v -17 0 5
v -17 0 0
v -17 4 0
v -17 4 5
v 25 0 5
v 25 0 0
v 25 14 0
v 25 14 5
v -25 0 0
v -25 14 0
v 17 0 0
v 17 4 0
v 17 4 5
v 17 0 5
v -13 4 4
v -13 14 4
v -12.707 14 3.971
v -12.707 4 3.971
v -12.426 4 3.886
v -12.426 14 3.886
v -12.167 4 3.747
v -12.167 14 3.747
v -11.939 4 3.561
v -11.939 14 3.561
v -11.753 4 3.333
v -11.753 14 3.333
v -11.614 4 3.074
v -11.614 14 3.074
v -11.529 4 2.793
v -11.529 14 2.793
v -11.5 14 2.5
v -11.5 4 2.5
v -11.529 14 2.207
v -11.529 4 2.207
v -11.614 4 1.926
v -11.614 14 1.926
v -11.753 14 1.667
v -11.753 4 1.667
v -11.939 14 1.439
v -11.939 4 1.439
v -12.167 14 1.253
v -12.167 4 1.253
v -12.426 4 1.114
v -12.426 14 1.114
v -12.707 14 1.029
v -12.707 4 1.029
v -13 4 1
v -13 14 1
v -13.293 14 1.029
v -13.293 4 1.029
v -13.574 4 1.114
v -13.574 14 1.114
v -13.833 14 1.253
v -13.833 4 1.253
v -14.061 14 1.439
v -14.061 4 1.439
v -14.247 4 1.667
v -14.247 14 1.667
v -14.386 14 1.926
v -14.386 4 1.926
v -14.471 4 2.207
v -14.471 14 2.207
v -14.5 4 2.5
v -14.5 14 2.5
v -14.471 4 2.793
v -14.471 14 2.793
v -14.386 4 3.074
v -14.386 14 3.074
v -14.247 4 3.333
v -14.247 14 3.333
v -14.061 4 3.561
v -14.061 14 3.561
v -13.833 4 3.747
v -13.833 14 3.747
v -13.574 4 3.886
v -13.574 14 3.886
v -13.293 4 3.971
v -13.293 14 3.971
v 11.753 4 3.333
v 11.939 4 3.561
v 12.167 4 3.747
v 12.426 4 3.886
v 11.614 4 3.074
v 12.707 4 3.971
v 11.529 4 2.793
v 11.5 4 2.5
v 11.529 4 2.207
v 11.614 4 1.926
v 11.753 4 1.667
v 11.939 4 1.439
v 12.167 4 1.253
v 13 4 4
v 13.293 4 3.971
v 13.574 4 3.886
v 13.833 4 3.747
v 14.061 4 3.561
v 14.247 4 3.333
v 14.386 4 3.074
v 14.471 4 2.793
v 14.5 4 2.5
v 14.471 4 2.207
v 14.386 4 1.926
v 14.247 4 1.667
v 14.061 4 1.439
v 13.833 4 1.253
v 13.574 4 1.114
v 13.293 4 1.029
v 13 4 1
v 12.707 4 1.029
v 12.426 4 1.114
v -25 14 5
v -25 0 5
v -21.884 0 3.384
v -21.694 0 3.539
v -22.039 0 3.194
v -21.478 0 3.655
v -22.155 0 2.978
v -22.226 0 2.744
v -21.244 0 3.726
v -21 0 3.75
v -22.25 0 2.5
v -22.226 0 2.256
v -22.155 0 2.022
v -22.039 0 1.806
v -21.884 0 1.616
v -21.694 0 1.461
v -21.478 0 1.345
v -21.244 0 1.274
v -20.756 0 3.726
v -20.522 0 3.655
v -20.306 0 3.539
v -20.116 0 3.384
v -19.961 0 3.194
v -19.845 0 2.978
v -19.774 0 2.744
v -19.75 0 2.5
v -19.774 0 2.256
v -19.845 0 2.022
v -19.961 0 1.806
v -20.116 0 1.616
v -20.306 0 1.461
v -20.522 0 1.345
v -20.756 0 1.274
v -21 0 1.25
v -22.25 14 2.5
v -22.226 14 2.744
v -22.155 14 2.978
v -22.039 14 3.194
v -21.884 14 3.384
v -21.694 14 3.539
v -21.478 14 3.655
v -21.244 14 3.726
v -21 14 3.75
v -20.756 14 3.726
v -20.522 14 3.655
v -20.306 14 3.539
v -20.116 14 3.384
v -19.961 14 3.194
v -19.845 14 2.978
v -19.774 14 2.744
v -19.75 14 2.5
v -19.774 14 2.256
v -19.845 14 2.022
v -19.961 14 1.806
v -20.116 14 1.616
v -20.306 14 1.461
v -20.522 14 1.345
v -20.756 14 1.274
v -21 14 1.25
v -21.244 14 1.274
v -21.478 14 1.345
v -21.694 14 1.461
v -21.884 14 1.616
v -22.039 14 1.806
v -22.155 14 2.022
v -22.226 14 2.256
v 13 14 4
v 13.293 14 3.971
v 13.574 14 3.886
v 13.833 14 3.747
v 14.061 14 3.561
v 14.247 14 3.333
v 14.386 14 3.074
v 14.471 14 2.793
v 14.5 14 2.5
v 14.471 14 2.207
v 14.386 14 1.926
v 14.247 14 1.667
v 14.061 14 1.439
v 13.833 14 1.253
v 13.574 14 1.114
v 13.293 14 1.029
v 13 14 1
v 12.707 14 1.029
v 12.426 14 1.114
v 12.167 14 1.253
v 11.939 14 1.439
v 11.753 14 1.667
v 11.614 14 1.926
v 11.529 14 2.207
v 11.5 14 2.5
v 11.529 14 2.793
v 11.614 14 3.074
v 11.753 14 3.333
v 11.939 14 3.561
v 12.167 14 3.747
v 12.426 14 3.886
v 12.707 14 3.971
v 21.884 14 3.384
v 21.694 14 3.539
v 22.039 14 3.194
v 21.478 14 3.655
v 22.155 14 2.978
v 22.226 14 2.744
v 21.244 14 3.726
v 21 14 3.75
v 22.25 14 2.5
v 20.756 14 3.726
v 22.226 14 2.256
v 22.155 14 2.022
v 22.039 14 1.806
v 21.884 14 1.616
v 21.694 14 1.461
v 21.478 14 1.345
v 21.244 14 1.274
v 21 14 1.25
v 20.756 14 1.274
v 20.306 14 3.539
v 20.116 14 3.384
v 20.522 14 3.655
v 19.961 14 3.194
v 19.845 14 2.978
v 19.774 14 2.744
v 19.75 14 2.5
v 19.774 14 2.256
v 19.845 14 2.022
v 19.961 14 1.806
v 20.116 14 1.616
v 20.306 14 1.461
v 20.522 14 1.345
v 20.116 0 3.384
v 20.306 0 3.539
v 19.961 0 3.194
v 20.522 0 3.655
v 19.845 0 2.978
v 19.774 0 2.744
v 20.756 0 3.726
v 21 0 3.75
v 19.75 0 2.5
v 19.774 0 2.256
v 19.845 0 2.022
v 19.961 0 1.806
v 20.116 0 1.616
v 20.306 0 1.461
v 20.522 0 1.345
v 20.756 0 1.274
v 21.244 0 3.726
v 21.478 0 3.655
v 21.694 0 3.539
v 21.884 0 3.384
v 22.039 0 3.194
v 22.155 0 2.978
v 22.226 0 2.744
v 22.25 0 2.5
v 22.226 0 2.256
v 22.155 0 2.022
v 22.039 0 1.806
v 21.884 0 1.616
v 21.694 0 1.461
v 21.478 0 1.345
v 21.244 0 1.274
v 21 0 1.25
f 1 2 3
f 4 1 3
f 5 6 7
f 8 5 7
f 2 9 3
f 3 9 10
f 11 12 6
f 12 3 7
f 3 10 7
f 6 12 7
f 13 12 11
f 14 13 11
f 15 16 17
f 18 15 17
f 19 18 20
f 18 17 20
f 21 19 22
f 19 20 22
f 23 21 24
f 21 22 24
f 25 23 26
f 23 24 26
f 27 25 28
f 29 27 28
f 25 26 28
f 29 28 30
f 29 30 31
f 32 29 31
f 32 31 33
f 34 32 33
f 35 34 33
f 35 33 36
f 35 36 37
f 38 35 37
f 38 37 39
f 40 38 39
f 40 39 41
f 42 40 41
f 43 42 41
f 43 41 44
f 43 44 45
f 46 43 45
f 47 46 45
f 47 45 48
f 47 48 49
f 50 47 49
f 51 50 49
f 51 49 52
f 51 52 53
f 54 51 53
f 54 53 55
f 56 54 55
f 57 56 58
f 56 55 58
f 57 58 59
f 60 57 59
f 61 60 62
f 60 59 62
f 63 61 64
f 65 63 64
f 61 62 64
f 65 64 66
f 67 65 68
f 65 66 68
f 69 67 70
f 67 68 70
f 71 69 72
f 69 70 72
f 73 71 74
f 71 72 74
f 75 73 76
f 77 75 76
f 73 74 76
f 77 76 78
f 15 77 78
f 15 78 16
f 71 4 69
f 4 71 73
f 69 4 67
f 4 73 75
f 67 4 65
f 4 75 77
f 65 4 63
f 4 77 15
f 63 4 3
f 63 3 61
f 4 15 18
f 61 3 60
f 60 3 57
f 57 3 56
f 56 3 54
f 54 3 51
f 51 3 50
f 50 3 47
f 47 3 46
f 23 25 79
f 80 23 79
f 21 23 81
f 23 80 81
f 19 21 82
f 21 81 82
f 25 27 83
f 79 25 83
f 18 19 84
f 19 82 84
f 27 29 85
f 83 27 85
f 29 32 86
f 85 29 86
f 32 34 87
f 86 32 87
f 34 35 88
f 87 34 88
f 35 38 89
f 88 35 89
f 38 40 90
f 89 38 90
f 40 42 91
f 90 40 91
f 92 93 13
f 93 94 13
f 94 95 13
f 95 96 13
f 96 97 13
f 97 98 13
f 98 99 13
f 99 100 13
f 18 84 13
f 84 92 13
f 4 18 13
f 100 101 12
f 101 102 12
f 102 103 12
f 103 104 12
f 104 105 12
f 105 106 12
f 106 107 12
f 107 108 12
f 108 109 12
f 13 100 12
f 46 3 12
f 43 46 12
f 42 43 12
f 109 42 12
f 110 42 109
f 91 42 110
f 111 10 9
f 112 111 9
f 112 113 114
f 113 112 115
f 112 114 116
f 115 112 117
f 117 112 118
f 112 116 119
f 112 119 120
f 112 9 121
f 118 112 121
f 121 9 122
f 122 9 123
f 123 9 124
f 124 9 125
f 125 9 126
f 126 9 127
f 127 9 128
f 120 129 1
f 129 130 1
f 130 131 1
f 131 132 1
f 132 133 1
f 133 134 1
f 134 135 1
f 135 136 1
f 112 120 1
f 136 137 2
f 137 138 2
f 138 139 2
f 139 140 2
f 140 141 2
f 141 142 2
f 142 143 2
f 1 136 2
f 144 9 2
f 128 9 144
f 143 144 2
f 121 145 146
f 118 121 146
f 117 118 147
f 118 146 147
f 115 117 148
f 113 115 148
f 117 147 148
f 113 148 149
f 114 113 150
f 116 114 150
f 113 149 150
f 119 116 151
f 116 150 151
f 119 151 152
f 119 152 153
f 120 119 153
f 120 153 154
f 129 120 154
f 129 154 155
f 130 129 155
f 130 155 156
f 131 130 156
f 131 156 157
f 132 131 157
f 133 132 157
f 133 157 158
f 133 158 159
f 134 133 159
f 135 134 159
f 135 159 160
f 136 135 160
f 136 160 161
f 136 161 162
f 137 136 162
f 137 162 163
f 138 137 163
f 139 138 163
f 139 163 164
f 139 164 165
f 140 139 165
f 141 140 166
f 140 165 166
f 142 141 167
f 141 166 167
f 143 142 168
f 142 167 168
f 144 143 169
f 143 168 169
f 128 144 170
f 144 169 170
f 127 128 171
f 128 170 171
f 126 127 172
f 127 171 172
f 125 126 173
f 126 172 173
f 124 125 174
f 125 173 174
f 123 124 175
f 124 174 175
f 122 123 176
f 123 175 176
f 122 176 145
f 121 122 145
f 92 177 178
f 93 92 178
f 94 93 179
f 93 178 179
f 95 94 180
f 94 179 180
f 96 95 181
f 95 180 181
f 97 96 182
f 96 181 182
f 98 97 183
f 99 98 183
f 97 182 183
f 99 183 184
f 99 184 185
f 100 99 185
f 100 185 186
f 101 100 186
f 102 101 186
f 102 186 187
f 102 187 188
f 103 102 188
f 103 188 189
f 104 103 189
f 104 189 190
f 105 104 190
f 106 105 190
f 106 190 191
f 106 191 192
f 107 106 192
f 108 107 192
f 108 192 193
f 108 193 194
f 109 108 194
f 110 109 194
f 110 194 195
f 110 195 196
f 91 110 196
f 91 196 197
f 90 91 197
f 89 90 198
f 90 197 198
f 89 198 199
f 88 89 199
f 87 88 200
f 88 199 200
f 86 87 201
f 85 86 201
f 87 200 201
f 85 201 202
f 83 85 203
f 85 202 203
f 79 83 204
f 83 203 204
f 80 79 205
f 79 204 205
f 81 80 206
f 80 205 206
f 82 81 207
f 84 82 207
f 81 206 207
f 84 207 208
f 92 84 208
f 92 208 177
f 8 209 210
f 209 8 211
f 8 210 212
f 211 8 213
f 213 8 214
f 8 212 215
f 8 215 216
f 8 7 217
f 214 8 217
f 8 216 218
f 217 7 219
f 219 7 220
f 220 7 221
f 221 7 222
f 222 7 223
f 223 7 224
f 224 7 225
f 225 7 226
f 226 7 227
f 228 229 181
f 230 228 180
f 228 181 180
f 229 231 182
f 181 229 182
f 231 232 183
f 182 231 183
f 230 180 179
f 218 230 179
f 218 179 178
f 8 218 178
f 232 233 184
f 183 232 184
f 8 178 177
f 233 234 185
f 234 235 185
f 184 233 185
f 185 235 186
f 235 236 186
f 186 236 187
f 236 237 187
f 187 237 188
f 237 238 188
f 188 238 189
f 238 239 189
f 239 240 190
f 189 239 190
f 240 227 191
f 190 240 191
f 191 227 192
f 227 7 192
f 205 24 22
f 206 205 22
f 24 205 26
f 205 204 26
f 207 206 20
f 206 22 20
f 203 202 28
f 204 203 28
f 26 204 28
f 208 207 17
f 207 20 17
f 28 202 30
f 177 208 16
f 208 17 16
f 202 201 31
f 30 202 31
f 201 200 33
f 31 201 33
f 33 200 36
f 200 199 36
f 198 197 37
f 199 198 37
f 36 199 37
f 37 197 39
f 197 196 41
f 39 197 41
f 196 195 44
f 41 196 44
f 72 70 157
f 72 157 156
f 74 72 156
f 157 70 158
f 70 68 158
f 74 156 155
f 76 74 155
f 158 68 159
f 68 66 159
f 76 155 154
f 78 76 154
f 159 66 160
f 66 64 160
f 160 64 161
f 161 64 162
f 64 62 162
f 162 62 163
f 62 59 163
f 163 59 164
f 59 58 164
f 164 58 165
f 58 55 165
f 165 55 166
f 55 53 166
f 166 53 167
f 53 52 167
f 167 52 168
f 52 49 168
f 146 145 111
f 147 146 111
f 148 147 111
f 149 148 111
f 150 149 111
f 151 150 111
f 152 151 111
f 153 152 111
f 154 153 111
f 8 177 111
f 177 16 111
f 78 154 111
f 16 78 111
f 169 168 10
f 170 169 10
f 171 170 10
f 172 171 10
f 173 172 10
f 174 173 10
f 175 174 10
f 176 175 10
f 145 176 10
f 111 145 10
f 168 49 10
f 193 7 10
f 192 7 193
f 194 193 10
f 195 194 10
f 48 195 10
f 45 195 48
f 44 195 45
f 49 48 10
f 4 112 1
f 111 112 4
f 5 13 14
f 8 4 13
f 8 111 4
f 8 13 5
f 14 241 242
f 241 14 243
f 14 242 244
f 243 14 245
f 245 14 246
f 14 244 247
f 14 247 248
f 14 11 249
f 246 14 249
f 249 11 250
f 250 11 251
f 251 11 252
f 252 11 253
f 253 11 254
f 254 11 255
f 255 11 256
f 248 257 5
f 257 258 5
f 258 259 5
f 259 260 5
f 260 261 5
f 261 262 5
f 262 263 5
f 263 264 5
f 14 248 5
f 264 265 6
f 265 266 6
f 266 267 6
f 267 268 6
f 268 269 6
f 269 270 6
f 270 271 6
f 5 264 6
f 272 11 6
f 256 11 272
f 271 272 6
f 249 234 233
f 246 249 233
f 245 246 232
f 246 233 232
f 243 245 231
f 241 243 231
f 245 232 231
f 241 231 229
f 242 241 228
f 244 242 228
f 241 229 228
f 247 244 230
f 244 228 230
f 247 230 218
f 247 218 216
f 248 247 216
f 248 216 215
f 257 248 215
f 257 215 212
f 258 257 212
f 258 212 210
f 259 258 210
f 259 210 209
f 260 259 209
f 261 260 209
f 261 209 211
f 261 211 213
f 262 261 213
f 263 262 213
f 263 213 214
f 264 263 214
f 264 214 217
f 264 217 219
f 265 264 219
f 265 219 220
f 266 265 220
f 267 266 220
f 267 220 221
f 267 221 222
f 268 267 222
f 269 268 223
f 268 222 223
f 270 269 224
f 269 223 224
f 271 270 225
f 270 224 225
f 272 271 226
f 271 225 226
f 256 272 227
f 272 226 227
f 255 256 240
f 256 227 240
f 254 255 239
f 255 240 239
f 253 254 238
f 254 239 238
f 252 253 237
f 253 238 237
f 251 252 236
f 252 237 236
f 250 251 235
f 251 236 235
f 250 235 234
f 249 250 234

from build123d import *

# Parameters (mm, degrees)
EXTRUSION1_DEPTH        = 5
ESQUISSE3_R             = 1.5
ENL_V_MAT_EXTRU_1_DEPTH = 30.086079144
TROU_TARAUD_M3X0_51_D   = 2.5


with BuildPart() as part:
    # Esquisse1 → Extrusion1 (new body)
    with BuildSketch(Plane.XY):
        Polygon((-25, 0), (-17, 0), (-17, 4), (17, 4), (17, 0), (25, 0), (25, 14), (-25, 14), align=None)
    extrude(amount=EXTRUSION1_DEPTH)

    # Esquisse3 → Enlèv. mat.-Extru.1 (cut, through all)
    with BuildSketch(Plane(origin=(0, 14, 0), x_dir=(1, 0, 0), z_dir=(0, 1, 0))):
        with Locations(Location((13, -2.5, 0), (0, 0, 270))):
            Circle(ESQUISSE3_R)
        with Locations(Location((-13, -2.5, 0), (0, 0, 270))):
            Circle(ESQUISSE3_R)
    extrude(amount=-ENL_V_MAT_EXTRU_1_DEPTH, mode=Mode.SUBTRACT)

    # Trou taraudé M3x0.51 (through all)
    with Locations(Plane.XZ):
        with Locations((-21, 2.5), (21, 2.5)):
            Hole(TROU_TARAUD_M3X0_51_D / 2)


solid = part.part
